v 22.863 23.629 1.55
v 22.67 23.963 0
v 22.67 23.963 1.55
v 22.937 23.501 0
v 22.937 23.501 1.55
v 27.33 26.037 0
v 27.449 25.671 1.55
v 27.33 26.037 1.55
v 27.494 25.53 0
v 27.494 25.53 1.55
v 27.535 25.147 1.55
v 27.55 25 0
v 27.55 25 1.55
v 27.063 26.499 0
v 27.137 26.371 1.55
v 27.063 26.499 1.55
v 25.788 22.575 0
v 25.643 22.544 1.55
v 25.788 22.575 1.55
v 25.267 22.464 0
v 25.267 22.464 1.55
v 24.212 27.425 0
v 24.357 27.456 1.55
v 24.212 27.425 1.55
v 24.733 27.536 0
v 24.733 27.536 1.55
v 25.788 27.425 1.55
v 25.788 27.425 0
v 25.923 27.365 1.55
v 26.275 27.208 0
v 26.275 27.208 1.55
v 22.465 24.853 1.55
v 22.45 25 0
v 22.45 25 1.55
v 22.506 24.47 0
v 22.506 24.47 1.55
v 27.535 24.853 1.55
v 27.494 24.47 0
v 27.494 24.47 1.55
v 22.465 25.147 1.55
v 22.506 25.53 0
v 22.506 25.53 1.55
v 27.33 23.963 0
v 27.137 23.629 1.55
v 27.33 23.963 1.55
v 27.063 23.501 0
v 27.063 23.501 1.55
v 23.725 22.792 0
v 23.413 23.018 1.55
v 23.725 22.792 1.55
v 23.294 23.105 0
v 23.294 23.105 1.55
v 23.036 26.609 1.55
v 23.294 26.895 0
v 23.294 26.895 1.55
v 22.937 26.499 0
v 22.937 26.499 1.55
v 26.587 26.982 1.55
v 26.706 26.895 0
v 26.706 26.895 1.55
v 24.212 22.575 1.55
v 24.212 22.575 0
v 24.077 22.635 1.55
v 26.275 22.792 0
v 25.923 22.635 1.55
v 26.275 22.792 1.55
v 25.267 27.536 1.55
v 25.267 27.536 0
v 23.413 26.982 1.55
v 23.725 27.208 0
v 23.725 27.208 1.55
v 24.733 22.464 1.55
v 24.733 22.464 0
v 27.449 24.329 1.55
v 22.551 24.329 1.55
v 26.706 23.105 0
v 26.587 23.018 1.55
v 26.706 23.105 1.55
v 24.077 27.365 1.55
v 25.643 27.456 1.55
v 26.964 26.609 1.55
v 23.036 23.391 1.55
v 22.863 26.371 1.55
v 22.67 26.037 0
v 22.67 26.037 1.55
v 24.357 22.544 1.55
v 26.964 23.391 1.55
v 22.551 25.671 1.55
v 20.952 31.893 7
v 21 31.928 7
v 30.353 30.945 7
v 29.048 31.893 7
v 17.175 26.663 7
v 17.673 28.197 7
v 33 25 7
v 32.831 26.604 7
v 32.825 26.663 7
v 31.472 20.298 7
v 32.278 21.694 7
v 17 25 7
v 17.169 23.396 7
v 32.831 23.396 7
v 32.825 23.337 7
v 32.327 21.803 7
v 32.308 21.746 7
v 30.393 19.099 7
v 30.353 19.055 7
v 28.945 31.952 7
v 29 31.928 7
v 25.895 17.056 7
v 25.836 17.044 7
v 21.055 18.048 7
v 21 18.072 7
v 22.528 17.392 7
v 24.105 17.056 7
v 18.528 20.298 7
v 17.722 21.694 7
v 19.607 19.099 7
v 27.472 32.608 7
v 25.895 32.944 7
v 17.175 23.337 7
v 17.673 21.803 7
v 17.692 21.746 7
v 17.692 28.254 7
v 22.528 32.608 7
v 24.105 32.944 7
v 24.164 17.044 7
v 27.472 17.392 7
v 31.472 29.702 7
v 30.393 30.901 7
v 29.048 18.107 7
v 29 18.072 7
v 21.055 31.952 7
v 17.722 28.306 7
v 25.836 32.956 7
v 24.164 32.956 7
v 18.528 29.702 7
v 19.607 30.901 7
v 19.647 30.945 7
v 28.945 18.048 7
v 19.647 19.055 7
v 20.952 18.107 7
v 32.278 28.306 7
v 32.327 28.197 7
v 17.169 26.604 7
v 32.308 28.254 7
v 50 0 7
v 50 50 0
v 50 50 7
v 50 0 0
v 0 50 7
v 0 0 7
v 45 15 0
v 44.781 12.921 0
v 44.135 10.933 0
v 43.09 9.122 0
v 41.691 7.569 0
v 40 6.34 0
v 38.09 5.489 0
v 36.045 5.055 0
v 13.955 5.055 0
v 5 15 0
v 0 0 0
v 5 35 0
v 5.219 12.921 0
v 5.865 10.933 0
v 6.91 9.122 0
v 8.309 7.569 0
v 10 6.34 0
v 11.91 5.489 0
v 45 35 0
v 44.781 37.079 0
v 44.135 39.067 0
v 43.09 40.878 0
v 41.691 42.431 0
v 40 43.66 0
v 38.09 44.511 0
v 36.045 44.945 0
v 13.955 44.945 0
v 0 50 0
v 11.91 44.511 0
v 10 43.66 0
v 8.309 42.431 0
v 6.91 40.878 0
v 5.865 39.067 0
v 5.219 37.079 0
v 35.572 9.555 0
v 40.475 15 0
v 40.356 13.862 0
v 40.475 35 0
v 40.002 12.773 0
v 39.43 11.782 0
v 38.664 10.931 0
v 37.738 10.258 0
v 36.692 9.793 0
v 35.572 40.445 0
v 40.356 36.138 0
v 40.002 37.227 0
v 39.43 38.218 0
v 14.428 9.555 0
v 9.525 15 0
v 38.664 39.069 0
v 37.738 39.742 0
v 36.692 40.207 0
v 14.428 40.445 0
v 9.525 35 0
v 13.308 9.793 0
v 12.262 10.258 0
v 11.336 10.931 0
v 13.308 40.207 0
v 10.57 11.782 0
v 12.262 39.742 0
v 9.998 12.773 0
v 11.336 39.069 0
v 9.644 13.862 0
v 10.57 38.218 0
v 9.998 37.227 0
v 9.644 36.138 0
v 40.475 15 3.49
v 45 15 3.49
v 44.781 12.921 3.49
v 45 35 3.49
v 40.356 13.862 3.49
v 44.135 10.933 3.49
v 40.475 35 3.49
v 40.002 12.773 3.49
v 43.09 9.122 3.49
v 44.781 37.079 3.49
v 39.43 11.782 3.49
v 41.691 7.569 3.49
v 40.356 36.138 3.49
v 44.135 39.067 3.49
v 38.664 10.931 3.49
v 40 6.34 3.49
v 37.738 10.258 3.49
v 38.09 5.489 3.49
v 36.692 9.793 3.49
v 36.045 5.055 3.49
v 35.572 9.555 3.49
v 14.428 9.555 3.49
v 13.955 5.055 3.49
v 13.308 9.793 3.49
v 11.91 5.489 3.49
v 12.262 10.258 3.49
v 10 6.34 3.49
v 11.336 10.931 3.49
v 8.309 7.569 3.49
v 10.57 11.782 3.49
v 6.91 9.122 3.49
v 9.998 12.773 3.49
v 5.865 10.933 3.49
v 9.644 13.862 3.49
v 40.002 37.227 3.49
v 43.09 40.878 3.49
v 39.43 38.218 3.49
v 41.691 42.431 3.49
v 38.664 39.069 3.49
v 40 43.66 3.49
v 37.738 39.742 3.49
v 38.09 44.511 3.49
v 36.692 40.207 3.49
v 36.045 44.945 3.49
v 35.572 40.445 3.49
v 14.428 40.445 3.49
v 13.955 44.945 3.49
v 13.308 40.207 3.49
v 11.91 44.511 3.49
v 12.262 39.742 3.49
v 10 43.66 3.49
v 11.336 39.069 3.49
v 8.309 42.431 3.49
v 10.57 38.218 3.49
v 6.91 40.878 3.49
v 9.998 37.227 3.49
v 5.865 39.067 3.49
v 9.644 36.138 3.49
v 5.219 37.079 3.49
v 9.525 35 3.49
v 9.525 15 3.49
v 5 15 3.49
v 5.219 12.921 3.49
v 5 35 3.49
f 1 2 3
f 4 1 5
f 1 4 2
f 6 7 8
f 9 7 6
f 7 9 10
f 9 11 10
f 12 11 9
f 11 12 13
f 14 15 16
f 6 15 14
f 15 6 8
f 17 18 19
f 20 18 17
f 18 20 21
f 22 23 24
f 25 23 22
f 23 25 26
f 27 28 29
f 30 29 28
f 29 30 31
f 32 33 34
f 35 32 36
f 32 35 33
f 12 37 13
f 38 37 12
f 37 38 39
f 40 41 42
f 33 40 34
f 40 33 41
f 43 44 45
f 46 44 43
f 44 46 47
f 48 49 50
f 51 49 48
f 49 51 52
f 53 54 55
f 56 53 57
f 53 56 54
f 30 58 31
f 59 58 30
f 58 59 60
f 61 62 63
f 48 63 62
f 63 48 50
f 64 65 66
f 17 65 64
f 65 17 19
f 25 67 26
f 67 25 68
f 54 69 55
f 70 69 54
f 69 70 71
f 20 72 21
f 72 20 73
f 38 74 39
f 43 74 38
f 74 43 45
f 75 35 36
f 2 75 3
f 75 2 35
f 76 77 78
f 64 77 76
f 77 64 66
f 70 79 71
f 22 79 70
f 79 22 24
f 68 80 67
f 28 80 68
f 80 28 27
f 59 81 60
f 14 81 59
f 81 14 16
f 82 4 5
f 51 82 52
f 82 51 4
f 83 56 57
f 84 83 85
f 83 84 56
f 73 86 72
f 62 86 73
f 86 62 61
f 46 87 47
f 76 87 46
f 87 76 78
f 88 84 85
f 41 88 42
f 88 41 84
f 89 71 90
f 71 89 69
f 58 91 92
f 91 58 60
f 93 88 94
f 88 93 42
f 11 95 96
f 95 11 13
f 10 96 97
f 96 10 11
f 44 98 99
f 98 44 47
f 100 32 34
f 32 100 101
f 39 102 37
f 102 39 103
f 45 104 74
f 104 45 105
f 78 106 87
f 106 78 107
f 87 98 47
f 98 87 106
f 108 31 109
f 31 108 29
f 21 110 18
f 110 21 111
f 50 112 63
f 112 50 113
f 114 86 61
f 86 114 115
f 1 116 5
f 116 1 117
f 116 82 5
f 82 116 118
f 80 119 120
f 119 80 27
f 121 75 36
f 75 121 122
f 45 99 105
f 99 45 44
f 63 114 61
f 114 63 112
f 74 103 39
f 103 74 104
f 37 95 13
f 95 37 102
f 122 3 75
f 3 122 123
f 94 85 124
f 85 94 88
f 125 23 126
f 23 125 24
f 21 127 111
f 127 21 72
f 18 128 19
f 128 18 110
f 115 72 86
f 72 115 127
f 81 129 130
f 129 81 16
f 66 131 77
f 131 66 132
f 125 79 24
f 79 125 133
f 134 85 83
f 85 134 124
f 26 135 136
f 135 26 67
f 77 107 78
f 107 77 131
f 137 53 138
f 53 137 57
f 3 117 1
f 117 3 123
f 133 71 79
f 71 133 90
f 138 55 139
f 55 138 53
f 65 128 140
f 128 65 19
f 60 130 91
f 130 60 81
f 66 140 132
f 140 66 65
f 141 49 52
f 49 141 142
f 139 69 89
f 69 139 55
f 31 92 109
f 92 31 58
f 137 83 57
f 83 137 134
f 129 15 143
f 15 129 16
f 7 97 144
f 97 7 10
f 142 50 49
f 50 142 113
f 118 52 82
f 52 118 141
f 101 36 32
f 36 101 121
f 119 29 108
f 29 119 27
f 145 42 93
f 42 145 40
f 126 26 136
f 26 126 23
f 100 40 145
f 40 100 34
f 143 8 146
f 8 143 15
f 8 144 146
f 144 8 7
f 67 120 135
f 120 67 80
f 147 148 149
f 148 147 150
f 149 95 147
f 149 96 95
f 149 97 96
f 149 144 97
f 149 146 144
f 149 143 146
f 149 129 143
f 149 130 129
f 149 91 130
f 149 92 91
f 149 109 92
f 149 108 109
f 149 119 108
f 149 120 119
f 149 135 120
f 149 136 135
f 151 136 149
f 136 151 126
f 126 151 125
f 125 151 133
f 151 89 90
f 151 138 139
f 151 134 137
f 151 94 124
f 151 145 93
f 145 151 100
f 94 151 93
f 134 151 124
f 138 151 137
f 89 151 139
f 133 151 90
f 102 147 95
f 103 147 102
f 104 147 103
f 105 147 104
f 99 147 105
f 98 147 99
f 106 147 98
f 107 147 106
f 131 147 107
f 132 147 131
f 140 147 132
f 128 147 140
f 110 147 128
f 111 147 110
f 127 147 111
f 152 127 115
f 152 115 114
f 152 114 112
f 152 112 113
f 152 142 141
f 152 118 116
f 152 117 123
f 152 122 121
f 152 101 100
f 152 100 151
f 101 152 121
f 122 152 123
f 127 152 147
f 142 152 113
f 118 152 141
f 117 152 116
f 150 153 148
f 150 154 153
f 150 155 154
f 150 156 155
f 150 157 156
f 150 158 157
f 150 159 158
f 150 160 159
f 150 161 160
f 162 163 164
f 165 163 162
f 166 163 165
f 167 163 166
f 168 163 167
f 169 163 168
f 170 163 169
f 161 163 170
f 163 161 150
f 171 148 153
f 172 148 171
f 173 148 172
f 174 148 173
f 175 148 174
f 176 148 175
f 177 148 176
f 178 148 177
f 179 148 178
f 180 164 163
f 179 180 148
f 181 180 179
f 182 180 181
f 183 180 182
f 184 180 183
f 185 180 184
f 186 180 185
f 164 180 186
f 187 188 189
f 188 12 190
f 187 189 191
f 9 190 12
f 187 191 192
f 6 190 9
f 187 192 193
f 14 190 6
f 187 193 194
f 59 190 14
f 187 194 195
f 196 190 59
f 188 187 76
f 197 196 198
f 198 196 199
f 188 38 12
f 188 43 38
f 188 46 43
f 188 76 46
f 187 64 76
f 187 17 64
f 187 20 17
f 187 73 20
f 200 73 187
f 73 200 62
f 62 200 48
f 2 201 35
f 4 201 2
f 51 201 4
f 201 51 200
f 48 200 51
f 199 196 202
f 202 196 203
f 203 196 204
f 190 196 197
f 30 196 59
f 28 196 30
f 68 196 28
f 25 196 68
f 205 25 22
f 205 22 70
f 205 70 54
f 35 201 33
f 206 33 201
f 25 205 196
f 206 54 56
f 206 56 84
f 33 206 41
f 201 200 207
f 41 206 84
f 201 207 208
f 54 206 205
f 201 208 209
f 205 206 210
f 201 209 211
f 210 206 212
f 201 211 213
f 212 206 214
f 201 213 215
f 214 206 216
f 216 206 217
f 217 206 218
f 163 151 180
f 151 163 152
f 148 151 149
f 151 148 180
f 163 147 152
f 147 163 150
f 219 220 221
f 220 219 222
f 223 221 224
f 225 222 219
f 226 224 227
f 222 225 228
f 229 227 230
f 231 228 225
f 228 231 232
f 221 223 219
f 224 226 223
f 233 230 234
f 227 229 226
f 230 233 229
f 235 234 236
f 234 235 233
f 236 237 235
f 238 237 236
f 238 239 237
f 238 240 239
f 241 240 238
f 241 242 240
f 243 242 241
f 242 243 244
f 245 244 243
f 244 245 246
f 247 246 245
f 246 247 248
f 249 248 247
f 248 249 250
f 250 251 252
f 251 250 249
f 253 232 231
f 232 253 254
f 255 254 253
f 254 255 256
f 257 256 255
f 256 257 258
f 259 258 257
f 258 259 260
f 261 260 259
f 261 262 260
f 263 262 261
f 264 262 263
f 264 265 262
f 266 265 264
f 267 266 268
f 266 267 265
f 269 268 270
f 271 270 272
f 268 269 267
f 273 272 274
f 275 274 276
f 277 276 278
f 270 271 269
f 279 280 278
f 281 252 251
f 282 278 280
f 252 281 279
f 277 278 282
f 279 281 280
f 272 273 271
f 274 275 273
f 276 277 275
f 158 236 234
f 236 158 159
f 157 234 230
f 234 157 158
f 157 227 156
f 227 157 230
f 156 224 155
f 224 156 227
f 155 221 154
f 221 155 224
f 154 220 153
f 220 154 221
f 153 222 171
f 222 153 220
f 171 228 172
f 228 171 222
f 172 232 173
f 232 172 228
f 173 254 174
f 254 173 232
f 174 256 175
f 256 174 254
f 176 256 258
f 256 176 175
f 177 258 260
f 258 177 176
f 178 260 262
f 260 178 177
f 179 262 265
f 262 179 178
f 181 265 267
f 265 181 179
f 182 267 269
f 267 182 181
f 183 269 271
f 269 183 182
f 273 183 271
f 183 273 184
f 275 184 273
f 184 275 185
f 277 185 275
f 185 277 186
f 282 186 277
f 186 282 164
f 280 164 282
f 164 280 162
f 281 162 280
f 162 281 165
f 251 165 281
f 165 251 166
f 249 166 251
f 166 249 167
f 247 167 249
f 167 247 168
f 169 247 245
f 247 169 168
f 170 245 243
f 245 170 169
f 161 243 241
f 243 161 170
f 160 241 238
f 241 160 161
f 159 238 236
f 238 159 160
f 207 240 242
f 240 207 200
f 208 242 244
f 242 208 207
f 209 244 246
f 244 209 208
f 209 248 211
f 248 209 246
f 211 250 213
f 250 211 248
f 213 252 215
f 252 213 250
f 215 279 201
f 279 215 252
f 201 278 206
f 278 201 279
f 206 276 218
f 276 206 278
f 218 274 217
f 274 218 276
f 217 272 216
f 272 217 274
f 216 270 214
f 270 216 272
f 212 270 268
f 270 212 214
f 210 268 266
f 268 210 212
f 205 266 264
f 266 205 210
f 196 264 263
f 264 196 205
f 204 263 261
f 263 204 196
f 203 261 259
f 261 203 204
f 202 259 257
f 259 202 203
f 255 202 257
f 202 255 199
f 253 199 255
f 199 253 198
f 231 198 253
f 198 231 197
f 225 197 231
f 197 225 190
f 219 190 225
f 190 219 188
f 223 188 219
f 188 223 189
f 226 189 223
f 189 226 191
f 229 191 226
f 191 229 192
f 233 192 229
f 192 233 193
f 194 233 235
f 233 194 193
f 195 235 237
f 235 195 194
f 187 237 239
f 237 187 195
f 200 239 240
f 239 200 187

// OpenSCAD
// Rubber tube seal test

tiny = 0.01;

wall = 7;
difference() {
  cube([50,50,7]);
  
  translate([5,5,-tiny]) rounded_mask(40,40);
  
  translate([25,25,0]) PunchHole(7);
   
//  translate([5,-tiny,-tiny]) cube([4.5, 50+2*tiny, 3]);
  
}

module rounded_mask(x,y,r=10,w=4.5, d=3.5) {
  linear_extrude(d) difference() {
    hull() {
      translate([r,r]) circle(r=r);
      translate([x-r,r]) circle(r=r);
      translate([r,y-r]) circle(r=r);
      translate([x-r,y-r]) circle(r=r);
    }
    hull() offset(-w) {
      translate([r,r]) circle(r=r);
      translate([x-r,r]) circle(r=r);
      translate([r,y-r]) circle(r=r);
      translate([x-r,y-r]) circle(r=r);
    }
  }
}

module PunchHole(wall) {
  // Pin diameter is 5 mm and we need the hole a little bigger
  pin_dia = 5;
  r1 = (pin_dia-1) / 2; 
  r2 = r1 + wall;
  // Pin hole
  translate([0,0,-0.01]) cylinder(d=pin_dia+0.1,h=wall+0.02,$fn=30);
  // Countersink
  translate([0,0,1]) cylinder(r1=r1,r2=r2,h=wall,$fn=30);
}
